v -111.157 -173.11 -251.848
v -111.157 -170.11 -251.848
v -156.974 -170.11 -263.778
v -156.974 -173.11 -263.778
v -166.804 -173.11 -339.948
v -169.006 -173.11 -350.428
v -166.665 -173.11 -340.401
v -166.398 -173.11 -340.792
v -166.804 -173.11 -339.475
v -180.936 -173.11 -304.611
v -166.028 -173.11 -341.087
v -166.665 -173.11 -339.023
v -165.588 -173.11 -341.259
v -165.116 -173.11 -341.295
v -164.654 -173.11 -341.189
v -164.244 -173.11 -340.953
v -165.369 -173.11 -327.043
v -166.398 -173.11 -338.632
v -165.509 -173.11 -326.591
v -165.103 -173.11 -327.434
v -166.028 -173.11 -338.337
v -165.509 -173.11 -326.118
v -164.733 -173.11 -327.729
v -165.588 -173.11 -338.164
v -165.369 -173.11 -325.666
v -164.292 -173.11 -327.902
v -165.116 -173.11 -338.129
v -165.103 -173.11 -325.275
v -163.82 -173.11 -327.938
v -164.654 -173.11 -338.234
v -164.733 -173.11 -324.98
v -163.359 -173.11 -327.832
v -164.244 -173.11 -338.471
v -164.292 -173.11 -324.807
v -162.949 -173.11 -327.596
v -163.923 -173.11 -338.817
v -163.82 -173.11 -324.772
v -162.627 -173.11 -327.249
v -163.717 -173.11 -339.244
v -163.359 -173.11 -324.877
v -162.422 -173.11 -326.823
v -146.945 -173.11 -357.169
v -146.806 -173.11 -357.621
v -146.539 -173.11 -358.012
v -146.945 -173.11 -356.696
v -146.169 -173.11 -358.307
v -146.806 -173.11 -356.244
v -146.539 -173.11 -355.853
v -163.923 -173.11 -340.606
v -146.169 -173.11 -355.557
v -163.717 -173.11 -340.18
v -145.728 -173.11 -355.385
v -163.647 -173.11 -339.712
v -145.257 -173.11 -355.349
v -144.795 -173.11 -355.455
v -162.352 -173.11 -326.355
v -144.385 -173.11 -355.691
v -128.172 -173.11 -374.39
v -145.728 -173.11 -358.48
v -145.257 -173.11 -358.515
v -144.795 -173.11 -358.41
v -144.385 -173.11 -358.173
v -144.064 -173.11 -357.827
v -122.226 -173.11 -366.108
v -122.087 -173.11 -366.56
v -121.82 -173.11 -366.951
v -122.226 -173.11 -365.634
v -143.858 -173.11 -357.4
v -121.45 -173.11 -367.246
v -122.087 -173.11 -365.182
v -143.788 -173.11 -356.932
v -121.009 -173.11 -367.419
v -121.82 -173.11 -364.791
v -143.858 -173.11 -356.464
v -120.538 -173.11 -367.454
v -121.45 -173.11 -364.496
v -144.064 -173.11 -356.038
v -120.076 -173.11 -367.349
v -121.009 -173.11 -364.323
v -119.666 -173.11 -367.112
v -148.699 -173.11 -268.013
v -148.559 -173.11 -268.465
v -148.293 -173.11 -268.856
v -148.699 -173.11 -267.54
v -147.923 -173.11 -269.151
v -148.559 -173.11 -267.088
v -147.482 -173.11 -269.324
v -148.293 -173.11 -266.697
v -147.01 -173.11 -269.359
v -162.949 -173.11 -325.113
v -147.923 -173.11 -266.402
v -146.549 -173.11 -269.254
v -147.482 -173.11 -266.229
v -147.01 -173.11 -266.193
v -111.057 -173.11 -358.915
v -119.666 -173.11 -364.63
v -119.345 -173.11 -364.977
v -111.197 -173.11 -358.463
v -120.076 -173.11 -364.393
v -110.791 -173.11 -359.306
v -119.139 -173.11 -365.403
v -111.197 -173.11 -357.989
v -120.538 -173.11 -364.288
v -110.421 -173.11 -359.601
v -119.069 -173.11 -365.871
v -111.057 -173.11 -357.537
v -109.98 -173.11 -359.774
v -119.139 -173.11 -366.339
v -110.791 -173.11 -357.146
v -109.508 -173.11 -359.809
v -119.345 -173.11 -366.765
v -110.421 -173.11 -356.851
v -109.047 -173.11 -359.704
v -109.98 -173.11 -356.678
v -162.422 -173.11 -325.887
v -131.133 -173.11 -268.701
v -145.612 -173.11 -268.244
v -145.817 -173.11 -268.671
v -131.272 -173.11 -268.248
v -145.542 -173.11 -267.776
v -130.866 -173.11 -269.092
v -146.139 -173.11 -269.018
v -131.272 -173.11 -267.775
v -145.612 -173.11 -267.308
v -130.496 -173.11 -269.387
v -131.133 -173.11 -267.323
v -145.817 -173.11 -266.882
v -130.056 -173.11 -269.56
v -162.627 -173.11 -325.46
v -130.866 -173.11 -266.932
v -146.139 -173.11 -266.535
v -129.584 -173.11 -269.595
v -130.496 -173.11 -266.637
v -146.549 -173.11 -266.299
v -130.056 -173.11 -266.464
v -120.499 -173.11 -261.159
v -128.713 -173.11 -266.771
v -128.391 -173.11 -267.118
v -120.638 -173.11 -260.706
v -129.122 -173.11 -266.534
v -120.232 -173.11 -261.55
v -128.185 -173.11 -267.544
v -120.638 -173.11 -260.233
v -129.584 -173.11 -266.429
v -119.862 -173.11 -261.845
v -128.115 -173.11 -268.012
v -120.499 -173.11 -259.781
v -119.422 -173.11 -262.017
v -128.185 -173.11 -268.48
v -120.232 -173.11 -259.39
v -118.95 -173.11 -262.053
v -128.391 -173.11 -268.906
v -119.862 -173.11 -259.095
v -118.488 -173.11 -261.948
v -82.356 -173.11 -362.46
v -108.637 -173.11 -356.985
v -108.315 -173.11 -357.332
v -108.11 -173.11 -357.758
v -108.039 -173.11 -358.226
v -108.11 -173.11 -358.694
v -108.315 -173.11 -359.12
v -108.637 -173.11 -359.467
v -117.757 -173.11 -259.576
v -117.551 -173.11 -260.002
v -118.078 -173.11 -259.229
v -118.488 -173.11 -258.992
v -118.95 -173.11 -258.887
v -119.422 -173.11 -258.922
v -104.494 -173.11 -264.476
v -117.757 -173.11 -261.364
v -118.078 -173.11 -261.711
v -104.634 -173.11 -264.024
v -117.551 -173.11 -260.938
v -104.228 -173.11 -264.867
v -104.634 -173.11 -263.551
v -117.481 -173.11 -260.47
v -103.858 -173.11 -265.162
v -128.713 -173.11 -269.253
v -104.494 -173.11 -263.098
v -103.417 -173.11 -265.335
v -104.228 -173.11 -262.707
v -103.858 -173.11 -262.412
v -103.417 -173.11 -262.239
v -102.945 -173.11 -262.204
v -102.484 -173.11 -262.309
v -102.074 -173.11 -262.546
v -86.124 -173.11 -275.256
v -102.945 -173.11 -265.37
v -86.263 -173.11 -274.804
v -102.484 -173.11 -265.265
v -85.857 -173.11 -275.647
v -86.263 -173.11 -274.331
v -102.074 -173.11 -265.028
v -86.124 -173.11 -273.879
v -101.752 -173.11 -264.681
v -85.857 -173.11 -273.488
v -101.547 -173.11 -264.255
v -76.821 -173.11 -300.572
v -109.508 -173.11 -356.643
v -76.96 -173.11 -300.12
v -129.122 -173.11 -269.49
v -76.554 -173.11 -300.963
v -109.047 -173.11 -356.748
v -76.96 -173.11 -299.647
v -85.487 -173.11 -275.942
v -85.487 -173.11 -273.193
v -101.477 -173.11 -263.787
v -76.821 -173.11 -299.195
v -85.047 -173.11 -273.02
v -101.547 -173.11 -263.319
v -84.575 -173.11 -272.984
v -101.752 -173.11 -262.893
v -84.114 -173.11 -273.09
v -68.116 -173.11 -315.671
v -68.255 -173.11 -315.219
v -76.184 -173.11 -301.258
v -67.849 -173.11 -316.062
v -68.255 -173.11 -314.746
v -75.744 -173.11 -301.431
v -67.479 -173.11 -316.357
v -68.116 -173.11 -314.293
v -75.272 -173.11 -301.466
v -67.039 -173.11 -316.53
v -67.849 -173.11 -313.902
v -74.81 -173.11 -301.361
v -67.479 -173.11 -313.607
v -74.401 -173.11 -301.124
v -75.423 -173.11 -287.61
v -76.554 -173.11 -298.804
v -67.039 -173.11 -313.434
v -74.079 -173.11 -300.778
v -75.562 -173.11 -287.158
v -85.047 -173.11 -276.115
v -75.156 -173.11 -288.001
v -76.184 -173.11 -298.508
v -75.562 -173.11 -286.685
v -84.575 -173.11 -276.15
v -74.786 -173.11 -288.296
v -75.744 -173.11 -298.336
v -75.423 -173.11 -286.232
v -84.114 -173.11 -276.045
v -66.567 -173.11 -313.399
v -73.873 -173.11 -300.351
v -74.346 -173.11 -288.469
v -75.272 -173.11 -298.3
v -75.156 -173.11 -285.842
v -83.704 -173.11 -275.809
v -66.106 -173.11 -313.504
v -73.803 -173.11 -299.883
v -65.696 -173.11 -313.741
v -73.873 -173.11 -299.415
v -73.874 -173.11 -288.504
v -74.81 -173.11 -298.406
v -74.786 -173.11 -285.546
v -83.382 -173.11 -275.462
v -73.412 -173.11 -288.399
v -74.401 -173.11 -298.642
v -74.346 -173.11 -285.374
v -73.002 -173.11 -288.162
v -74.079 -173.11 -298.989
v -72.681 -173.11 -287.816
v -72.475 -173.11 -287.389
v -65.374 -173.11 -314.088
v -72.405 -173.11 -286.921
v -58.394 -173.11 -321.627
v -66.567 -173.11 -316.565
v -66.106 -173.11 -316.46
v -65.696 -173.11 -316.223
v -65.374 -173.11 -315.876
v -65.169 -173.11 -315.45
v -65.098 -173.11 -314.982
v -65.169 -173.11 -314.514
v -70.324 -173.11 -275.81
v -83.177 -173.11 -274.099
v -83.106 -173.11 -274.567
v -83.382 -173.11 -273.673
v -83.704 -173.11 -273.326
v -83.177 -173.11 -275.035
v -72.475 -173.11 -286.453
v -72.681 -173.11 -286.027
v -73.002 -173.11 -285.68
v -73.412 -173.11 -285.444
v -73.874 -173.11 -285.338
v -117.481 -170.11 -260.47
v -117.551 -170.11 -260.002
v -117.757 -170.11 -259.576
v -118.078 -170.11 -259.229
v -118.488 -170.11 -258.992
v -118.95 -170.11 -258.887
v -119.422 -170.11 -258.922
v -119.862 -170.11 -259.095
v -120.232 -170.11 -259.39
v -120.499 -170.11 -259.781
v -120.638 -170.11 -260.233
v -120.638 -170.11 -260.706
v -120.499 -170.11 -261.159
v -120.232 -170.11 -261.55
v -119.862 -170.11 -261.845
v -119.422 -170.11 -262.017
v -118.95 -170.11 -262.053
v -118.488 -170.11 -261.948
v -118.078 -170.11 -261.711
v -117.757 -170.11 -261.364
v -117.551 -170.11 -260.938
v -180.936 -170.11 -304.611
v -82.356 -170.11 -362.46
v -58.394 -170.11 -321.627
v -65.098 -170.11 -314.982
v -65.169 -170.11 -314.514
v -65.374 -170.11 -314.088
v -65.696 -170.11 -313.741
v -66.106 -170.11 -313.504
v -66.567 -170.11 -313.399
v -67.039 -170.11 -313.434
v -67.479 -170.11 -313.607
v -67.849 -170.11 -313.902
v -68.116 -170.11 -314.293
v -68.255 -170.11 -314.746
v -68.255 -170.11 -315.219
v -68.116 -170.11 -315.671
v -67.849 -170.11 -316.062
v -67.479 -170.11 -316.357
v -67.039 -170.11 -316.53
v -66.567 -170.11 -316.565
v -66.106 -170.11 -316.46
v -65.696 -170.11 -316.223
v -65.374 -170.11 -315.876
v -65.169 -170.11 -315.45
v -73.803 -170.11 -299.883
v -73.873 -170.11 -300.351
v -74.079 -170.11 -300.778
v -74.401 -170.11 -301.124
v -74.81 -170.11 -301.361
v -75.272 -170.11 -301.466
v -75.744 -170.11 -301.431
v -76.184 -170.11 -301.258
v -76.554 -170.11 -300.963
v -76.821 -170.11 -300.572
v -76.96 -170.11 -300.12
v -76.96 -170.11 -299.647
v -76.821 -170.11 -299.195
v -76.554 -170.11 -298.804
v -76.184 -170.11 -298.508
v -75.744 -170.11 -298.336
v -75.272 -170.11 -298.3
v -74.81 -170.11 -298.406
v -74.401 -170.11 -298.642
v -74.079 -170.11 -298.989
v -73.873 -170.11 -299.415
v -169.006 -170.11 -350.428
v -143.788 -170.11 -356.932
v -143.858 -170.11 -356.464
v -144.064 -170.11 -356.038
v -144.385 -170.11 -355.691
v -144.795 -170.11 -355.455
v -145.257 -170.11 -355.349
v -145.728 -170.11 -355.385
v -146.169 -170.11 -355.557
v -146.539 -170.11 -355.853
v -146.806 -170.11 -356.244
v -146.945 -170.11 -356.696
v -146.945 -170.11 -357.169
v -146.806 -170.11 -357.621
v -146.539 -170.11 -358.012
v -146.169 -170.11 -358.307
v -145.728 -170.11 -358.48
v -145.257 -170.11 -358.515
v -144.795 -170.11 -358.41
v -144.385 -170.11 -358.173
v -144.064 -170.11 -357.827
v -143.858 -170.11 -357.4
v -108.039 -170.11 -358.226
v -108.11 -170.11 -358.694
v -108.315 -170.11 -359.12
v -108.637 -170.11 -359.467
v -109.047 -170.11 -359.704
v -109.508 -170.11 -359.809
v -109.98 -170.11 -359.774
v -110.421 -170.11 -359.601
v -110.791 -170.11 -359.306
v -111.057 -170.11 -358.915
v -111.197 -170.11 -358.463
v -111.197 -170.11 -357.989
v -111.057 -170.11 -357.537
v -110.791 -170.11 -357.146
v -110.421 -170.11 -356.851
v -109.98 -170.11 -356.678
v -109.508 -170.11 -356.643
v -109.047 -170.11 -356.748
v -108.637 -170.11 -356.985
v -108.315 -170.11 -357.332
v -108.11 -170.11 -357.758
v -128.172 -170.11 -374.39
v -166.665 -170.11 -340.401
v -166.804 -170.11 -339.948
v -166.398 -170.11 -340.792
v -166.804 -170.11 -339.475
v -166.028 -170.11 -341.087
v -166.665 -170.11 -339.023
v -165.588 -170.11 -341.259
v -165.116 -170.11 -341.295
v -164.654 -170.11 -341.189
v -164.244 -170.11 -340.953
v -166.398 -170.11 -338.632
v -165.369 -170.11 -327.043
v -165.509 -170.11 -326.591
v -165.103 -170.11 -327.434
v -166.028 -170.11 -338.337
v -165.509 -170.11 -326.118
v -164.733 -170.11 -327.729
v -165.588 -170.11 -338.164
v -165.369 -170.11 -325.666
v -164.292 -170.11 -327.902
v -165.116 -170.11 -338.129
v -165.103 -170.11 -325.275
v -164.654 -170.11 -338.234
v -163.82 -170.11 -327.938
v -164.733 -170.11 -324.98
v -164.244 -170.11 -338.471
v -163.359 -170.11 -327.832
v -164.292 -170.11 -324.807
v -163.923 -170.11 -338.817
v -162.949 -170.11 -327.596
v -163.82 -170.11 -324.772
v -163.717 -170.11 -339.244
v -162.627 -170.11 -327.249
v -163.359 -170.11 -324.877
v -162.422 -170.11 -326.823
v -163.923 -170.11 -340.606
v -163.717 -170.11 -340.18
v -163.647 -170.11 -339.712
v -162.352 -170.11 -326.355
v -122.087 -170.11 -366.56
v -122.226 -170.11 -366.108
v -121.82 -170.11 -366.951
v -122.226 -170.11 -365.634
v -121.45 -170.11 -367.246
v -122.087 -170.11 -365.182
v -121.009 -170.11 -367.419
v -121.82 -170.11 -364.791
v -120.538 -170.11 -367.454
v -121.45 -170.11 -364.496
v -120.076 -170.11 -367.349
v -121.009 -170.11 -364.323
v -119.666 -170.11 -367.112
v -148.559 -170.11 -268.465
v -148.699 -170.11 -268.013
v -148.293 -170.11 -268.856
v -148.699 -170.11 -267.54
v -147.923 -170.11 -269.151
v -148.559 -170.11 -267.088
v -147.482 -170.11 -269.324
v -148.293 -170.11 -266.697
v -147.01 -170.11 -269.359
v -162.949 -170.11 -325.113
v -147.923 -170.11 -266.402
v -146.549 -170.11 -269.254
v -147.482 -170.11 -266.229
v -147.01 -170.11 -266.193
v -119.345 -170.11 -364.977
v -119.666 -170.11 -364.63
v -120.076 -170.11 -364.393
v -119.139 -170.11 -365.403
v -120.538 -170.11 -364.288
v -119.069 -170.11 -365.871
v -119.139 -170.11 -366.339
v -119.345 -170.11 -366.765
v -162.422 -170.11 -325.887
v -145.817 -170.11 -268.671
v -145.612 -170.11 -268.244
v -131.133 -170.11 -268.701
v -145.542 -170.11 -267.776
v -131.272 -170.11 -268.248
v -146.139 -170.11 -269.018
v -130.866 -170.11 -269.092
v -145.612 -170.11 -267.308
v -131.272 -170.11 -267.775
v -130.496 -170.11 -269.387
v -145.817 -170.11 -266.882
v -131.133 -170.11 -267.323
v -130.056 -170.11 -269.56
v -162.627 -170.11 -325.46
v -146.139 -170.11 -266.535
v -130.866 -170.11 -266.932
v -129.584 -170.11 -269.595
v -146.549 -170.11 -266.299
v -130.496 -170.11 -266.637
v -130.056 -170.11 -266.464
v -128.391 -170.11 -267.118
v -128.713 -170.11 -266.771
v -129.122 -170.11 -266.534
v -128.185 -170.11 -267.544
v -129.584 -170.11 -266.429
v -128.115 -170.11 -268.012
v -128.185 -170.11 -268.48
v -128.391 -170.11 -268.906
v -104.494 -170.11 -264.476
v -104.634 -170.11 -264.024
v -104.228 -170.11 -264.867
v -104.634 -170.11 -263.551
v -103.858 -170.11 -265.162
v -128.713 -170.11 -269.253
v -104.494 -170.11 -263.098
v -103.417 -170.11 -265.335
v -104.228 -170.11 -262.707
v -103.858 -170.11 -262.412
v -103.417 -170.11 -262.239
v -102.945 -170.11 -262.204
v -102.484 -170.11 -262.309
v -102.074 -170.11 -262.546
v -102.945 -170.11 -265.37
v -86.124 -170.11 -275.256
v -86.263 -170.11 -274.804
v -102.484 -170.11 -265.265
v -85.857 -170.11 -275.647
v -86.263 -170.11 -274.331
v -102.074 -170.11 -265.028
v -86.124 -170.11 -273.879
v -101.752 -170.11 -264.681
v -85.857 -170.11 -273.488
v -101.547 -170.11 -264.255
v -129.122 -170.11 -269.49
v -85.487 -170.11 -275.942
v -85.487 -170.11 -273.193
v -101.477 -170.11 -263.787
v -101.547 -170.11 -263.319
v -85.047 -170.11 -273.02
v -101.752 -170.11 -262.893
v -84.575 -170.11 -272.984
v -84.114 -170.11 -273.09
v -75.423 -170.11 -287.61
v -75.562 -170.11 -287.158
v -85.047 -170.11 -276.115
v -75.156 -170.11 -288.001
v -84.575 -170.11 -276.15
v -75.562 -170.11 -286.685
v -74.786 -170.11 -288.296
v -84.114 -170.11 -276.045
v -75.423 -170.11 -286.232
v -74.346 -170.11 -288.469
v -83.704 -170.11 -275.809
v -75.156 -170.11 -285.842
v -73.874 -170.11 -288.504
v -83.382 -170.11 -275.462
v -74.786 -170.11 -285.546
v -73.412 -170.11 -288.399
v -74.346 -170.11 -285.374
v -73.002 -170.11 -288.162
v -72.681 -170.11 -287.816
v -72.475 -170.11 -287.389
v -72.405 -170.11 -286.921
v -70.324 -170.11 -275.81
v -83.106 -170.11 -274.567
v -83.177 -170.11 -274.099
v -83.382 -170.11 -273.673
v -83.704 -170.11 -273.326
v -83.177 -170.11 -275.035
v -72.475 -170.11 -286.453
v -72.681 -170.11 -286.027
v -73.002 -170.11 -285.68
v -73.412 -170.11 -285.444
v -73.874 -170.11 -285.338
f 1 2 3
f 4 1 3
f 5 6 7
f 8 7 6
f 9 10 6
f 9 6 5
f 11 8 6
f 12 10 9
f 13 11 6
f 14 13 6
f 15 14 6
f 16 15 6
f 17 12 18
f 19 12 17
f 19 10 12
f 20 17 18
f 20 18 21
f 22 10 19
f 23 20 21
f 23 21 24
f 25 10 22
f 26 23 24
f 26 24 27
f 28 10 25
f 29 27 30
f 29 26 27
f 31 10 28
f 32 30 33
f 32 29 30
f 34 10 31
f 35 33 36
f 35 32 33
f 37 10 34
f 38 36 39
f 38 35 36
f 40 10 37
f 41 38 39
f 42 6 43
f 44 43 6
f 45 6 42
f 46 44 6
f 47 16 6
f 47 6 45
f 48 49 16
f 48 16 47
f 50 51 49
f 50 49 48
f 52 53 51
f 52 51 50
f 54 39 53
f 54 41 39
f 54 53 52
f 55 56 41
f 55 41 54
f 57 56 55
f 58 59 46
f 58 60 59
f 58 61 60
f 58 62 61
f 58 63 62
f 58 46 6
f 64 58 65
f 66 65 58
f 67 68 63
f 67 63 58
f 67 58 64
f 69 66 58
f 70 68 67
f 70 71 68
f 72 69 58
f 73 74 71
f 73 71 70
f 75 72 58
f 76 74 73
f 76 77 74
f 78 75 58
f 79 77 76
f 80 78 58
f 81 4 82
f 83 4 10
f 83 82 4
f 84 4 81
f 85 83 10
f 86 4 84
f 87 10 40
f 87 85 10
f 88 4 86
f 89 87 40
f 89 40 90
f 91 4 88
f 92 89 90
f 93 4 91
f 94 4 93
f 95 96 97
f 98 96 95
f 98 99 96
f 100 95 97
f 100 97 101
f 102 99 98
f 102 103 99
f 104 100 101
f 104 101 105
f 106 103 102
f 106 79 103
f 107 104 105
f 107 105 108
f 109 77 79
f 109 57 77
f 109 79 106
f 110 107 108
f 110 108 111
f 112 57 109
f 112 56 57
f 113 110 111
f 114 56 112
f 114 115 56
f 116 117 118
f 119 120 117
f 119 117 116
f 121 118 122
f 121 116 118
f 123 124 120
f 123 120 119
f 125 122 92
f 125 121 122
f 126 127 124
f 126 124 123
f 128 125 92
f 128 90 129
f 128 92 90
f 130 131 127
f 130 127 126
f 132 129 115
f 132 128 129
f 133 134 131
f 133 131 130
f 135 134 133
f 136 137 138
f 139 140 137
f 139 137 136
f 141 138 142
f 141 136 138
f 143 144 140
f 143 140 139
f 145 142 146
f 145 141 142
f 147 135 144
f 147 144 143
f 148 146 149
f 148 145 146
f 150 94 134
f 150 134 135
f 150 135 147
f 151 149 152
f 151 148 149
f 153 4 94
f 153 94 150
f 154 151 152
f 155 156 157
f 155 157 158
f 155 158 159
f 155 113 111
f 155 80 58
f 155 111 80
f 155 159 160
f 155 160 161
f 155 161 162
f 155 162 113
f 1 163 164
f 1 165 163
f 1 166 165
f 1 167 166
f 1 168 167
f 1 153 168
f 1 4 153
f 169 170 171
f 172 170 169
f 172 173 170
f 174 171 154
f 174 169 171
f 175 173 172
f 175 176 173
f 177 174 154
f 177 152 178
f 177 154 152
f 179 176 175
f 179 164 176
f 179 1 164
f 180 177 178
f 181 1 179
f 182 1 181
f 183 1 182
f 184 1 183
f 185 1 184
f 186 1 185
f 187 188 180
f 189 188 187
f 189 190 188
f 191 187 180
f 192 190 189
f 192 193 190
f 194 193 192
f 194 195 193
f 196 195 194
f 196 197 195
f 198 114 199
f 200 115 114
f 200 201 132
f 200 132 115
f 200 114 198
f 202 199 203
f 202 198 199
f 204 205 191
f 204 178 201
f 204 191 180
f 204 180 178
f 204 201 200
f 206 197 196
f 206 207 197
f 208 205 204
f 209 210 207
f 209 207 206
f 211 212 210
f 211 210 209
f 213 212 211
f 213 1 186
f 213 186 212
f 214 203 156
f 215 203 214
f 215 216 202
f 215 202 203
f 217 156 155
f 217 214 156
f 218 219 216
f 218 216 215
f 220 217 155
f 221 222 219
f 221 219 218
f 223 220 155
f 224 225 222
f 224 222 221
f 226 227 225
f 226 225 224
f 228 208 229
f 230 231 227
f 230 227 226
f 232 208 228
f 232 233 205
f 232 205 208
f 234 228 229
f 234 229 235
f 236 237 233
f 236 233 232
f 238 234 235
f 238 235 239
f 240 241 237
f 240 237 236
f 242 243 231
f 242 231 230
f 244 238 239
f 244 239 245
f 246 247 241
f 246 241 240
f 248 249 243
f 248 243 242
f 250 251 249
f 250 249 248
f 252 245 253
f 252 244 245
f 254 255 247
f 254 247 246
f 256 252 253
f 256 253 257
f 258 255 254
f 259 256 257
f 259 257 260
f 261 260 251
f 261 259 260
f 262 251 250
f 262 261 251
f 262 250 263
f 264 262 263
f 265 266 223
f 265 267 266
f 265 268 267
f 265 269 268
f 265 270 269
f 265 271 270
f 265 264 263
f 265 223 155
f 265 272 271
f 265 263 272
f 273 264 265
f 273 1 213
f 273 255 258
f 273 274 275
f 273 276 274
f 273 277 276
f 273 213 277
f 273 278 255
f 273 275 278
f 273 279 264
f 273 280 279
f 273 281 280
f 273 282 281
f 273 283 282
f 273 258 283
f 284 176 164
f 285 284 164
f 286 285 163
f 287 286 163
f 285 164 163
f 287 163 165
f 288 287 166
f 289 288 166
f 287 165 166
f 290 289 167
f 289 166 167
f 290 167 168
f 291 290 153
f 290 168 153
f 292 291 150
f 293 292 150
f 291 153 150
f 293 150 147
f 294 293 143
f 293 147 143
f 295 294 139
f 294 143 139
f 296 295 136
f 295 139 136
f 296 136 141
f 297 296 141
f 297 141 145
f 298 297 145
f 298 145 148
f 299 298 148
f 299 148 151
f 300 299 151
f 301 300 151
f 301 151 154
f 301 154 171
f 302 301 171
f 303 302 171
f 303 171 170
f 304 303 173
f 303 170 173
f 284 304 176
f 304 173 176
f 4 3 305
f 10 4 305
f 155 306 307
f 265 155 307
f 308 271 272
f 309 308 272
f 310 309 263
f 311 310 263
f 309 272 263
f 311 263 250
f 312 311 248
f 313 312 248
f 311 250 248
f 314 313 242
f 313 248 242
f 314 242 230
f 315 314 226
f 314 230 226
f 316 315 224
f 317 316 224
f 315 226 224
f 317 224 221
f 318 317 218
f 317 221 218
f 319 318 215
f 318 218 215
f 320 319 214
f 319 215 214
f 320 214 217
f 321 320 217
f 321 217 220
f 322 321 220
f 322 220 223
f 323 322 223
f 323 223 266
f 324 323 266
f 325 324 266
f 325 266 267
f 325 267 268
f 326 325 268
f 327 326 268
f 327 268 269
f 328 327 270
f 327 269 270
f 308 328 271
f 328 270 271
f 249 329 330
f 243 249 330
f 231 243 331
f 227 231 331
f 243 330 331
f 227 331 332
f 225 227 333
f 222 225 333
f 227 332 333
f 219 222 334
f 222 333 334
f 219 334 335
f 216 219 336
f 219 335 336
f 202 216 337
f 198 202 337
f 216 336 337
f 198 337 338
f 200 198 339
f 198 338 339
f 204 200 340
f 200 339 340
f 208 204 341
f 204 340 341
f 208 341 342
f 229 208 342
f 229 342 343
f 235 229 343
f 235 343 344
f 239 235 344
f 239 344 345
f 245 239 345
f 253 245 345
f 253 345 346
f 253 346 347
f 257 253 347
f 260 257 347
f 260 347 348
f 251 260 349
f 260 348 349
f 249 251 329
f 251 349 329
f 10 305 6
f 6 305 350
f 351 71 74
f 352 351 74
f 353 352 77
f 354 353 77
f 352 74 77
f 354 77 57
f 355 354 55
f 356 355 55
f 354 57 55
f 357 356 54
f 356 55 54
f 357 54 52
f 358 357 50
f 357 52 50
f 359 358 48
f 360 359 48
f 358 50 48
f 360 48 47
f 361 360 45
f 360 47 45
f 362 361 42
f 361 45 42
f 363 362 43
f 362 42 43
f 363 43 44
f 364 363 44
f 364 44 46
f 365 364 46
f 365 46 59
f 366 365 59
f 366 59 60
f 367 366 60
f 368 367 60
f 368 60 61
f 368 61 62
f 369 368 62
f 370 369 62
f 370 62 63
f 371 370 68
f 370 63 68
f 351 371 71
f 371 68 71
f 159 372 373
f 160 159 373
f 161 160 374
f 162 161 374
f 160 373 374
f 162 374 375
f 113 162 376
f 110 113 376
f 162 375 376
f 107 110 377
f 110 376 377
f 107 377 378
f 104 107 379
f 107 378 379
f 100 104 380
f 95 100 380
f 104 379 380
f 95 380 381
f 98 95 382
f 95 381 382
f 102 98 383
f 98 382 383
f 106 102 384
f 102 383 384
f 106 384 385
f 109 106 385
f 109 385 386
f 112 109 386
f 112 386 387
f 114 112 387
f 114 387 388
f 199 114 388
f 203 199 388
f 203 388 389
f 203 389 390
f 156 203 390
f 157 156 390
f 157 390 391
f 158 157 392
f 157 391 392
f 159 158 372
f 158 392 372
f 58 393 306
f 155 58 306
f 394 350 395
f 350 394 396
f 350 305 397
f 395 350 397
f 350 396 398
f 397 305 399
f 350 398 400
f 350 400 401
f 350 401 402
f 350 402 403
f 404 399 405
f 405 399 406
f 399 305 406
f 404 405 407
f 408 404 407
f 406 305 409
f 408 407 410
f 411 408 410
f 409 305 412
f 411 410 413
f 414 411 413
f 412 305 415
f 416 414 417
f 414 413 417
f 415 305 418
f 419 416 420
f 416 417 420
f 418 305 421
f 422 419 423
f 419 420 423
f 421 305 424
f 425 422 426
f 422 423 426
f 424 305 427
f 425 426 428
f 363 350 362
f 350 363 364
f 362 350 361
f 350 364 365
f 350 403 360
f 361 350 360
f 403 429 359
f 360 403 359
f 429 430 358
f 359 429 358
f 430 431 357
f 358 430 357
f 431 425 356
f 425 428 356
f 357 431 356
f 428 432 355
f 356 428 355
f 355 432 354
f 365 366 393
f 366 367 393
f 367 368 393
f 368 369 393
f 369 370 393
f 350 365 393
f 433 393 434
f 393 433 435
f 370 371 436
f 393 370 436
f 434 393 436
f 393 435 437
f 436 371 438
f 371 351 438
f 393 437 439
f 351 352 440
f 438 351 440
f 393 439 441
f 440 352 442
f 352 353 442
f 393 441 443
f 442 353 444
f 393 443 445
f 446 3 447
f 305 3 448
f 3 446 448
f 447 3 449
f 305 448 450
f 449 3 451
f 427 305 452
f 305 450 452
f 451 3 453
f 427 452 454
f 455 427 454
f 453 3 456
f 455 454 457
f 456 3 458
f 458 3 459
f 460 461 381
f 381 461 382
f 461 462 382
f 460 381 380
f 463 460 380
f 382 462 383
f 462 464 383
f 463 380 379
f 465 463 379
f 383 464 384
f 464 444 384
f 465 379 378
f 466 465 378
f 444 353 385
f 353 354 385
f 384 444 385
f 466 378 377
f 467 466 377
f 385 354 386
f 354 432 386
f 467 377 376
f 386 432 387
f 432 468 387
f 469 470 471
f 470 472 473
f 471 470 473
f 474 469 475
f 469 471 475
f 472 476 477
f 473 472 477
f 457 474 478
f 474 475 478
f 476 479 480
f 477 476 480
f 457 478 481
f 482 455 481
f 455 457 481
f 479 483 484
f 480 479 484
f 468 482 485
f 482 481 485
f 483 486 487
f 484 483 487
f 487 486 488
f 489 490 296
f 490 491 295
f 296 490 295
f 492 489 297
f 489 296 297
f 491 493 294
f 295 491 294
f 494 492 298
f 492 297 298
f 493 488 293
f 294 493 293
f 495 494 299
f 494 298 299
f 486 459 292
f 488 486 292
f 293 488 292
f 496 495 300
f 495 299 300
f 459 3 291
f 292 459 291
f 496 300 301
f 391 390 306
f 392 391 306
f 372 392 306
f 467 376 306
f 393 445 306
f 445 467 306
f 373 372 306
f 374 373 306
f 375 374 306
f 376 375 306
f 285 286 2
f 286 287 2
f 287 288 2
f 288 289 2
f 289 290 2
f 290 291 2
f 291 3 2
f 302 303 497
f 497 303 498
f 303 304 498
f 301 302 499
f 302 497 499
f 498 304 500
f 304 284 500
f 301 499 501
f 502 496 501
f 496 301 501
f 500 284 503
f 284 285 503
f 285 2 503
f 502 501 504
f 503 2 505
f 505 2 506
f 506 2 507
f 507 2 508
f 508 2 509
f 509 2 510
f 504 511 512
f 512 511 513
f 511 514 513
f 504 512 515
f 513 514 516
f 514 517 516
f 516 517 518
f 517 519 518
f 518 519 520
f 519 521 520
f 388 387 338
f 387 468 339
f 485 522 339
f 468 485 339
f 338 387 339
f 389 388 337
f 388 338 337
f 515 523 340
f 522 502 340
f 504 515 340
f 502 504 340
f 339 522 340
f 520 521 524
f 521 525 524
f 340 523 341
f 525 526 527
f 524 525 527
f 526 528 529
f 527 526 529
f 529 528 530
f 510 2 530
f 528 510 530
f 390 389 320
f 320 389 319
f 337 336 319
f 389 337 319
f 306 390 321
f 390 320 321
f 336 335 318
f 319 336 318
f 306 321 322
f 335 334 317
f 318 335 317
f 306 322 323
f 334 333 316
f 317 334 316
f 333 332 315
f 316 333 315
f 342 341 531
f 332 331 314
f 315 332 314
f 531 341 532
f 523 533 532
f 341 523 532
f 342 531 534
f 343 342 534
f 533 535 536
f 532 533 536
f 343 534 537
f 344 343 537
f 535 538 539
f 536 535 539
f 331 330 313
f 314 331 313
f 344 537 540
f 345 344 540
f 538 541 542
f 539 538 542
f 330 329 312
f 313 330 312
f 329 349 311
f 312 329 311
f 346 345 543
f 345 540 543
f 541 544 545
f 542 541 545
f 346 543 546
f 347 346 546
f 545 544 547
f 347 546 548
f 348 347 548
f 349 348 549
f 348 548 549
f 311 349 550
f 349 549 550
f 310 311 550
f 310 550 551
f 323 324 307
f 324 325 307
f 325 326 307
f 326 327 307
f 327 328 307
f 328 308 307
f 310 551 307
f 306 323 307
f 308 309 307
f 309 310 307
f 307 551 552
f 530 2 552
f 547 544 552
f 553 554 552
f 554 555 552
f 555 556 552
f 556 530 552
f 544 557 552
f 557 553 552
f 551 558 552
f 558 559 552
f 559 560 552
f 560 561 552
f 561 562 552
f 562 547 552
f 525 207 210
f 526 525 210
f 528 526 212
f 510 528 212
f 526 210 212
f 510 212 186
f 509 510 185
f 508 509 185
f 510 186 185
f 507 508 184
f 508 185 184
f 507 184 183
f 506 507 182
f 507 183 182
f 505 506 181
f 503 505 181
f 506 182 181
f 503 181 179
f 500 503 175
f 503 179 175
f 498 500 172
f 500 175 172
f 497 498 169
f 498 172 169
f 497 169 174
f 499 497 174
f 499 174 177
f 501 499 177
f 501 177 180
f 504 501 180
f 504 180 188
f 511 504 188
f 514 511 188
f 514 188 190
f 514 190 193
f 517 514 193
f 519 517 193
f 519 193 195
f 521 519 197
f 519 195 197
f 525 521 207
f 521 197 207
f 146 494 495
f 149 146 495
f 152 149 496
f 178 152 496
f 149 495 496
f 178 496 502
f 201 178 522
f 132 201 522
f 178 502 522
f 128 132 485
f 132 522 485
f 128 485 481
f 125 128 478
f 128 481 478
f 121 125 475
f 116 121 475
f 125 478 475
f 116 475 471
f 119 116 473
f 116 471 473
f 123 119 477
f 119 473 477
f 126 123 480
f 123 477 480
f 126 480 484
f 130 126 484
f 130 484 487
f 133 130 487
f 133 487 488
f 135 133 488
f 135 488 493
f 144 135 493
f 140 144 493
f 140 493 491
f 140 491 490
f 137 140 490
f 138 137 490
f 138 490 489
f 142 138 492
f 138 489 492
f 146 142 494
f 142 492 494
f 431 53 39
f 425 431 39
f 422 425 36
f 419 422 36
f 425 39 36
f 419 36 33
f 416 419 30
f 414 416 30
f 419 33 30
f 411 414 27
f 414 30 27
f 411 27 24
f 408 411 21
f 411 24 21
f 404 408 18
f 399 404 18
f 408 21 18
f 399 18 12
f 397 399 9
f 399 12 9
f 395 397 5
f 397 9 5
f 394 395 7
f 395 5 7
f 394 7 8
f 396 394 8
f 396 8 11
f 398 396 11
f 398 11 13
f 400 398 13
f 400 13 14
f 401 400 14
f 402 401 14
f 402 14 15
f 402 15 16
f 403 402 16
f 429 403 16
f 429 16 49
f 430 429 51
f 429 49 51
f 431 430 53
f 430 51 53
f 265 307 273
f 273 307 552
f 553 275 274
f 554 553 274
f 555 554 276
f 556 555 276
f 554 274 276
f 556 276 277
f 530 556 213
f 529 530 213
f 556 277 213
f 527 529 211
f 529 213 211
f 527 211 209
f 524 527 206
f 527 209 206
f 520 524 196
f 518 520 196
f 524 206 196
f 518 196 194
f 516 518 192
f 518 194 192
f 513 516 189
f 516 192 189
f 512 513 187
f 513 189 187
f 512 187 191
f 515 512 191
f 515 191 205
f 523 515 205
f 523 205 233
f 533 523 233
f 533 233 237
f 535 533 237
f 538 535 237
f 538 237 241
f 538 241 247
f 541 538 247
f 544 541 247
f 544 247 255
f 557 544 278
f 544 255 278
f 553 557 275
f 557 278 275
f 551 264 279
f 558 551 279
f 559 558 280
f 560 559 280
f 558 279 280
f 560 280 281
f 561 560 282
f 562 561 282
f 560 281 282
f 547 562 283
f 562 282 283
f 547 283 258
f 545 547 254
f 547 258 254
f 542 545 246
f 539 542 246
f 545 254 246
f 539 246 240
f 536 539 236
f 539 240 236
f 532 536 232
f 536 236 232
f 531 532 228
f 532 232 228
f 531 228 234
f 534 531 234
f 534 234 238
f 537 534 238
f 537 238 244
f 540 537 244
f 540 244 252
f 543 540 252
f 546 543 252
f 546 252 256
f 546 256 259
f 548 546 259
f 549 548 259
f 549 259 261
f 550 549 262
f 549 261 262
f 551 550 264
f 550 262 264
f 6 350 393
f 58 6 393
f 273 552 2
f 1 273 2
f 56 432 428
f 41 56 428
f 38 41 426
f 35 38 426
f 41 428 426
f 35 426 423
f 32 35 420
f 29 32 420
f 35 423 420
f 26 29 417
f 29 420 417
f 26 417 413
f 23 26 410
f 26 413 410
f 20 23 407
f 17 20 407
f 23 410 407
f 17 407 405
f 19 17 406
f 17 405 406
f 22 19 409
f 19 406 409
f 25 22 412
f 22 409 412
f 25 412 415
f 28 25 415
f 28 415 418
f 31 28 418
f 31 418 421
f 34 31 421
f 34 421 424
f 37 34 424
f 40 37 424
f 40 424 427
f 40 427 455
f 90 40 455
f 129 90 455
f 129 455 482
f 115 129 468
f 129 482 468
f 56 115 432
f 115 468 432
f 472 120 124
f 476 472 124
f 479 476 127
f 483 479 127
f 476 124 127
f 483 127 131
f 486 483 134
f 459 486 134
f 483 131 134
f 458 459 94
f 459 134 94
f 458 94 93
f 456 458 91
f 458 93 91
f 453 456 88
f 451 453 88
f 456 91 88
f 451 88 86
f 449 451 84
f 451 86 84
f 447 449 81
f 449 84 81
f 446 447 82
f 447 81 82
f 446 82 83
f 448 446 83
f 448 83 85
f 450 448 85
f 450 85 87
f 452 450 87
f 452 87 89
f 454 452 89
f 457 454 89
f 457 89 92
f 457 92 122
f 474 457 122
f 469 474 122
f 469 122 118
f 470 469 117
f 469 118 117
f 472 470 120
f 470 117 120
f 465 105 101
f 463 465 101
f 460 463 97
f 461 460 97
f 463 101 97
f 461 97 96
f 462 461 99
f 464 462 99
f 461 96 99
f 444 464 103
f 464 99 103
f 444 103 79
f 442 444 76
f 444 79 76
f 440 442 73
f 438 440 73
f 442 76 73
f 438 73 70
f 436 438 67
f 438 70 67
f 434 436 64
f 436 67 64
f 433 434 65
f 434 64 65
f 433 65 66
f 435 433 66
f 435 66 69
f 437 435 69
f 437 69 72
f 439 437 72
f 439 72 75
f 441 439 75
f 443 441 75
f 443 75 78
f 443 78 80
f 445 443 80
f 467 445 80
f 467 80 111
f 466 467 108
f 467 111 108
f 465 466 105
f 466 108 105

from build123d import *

# Parameters (mm, degrees)
BOSS_EXTRUDE1_DEPTH = 3
SKETCH2_R           = 1.5875
CUT_EXTRUDE1_DEPTH  = 3
SKETCH3_R           = 1.5875
CUT_EXTRUDE2_DEPTH  = 3


with BuildPart() as part:
    # Sketch1 → Boss-Extrude1 (new body)
    with BuildSketch(Plane(origin=(-113.226454214, -170.109741769, -309.439751514), x_dir=(0.890793361, 0, -0.454408614), z_dir=(0, -1, 0))):
        Polygon((16.200077076, -64.648683729), (51.592412285, -33.201987218), (54.382400165, 14.060345359), (22.935703655, 49.452680569), (-24.326628923, 52.242668449), (-59.718964132, 20.795971938), (-62.508952012, -26.466360639), (-31.062255502, -61.858695849), align=None)
    extrude(amount=BOSS_EXTRUDE1_DEPTH)

    # Sketch2 → Cut-Extrude1 (cut)
    with BuildSketch(Plane.XZ.offset(173.109741769)):
        with Locations((-145.375224309, -356.932300191)):
            Circle(SKETCH2_R)
        with Locations((-120.656222706, -365.870996639)):
            Circle(SKETCH2_R)
        with Locations((-165.234257313, -339.711726955)):
            Circle(SKETCH2_R)
        with Locations((-147.129073232, -267.776351499)):
            Circle(SKETCH2_R)
        with Locations((-119.068249233, -260.469800508)):
            Circle(SKETCH2_R)
        with Locations((-103.064133068, -263.787192741)):
            Circle(SKETCH2_R)
        with Locations((-84.693579832, -274.567395605)):
            Circle(SKETCH2_R)
        with Locations((-73.99225652, -286.921281828)):
            Circle(SKETCH2_R)
        with Locations((-66.685705529, -314.982105827)):
            Circle(SKETCH2_R)
    extrude(amount=-CUT_EXTRUDE1_DEPTH, mode=Mode.SUBTRACT)

    # Sketch3 → Cut-Extrude2 (cut)
    with BuildSketch(Plane(origin=(0, -170.109741769, 0), x_dir=(1, 0, 0), z_dir=(0, 1, 0))):
        with Locations((-163.939086588, 326.354614997)):
            Circle(SKETCH3_R)
        with Locations((-109.626964848, 358.226038945)):
            Circle(SKETCH3_R)
        with Locations((-75.39030048, 299.883308915)):
            Circle(SKETCH3_R)
        with Locations((-129.702422221, 268.011884967)):
            Circle(SKETCH3_R)
    extrude(amount=-CUT_EXTRUDE2_DEPTH, mode=Mode.SUBTRACT)


solid = part.part
